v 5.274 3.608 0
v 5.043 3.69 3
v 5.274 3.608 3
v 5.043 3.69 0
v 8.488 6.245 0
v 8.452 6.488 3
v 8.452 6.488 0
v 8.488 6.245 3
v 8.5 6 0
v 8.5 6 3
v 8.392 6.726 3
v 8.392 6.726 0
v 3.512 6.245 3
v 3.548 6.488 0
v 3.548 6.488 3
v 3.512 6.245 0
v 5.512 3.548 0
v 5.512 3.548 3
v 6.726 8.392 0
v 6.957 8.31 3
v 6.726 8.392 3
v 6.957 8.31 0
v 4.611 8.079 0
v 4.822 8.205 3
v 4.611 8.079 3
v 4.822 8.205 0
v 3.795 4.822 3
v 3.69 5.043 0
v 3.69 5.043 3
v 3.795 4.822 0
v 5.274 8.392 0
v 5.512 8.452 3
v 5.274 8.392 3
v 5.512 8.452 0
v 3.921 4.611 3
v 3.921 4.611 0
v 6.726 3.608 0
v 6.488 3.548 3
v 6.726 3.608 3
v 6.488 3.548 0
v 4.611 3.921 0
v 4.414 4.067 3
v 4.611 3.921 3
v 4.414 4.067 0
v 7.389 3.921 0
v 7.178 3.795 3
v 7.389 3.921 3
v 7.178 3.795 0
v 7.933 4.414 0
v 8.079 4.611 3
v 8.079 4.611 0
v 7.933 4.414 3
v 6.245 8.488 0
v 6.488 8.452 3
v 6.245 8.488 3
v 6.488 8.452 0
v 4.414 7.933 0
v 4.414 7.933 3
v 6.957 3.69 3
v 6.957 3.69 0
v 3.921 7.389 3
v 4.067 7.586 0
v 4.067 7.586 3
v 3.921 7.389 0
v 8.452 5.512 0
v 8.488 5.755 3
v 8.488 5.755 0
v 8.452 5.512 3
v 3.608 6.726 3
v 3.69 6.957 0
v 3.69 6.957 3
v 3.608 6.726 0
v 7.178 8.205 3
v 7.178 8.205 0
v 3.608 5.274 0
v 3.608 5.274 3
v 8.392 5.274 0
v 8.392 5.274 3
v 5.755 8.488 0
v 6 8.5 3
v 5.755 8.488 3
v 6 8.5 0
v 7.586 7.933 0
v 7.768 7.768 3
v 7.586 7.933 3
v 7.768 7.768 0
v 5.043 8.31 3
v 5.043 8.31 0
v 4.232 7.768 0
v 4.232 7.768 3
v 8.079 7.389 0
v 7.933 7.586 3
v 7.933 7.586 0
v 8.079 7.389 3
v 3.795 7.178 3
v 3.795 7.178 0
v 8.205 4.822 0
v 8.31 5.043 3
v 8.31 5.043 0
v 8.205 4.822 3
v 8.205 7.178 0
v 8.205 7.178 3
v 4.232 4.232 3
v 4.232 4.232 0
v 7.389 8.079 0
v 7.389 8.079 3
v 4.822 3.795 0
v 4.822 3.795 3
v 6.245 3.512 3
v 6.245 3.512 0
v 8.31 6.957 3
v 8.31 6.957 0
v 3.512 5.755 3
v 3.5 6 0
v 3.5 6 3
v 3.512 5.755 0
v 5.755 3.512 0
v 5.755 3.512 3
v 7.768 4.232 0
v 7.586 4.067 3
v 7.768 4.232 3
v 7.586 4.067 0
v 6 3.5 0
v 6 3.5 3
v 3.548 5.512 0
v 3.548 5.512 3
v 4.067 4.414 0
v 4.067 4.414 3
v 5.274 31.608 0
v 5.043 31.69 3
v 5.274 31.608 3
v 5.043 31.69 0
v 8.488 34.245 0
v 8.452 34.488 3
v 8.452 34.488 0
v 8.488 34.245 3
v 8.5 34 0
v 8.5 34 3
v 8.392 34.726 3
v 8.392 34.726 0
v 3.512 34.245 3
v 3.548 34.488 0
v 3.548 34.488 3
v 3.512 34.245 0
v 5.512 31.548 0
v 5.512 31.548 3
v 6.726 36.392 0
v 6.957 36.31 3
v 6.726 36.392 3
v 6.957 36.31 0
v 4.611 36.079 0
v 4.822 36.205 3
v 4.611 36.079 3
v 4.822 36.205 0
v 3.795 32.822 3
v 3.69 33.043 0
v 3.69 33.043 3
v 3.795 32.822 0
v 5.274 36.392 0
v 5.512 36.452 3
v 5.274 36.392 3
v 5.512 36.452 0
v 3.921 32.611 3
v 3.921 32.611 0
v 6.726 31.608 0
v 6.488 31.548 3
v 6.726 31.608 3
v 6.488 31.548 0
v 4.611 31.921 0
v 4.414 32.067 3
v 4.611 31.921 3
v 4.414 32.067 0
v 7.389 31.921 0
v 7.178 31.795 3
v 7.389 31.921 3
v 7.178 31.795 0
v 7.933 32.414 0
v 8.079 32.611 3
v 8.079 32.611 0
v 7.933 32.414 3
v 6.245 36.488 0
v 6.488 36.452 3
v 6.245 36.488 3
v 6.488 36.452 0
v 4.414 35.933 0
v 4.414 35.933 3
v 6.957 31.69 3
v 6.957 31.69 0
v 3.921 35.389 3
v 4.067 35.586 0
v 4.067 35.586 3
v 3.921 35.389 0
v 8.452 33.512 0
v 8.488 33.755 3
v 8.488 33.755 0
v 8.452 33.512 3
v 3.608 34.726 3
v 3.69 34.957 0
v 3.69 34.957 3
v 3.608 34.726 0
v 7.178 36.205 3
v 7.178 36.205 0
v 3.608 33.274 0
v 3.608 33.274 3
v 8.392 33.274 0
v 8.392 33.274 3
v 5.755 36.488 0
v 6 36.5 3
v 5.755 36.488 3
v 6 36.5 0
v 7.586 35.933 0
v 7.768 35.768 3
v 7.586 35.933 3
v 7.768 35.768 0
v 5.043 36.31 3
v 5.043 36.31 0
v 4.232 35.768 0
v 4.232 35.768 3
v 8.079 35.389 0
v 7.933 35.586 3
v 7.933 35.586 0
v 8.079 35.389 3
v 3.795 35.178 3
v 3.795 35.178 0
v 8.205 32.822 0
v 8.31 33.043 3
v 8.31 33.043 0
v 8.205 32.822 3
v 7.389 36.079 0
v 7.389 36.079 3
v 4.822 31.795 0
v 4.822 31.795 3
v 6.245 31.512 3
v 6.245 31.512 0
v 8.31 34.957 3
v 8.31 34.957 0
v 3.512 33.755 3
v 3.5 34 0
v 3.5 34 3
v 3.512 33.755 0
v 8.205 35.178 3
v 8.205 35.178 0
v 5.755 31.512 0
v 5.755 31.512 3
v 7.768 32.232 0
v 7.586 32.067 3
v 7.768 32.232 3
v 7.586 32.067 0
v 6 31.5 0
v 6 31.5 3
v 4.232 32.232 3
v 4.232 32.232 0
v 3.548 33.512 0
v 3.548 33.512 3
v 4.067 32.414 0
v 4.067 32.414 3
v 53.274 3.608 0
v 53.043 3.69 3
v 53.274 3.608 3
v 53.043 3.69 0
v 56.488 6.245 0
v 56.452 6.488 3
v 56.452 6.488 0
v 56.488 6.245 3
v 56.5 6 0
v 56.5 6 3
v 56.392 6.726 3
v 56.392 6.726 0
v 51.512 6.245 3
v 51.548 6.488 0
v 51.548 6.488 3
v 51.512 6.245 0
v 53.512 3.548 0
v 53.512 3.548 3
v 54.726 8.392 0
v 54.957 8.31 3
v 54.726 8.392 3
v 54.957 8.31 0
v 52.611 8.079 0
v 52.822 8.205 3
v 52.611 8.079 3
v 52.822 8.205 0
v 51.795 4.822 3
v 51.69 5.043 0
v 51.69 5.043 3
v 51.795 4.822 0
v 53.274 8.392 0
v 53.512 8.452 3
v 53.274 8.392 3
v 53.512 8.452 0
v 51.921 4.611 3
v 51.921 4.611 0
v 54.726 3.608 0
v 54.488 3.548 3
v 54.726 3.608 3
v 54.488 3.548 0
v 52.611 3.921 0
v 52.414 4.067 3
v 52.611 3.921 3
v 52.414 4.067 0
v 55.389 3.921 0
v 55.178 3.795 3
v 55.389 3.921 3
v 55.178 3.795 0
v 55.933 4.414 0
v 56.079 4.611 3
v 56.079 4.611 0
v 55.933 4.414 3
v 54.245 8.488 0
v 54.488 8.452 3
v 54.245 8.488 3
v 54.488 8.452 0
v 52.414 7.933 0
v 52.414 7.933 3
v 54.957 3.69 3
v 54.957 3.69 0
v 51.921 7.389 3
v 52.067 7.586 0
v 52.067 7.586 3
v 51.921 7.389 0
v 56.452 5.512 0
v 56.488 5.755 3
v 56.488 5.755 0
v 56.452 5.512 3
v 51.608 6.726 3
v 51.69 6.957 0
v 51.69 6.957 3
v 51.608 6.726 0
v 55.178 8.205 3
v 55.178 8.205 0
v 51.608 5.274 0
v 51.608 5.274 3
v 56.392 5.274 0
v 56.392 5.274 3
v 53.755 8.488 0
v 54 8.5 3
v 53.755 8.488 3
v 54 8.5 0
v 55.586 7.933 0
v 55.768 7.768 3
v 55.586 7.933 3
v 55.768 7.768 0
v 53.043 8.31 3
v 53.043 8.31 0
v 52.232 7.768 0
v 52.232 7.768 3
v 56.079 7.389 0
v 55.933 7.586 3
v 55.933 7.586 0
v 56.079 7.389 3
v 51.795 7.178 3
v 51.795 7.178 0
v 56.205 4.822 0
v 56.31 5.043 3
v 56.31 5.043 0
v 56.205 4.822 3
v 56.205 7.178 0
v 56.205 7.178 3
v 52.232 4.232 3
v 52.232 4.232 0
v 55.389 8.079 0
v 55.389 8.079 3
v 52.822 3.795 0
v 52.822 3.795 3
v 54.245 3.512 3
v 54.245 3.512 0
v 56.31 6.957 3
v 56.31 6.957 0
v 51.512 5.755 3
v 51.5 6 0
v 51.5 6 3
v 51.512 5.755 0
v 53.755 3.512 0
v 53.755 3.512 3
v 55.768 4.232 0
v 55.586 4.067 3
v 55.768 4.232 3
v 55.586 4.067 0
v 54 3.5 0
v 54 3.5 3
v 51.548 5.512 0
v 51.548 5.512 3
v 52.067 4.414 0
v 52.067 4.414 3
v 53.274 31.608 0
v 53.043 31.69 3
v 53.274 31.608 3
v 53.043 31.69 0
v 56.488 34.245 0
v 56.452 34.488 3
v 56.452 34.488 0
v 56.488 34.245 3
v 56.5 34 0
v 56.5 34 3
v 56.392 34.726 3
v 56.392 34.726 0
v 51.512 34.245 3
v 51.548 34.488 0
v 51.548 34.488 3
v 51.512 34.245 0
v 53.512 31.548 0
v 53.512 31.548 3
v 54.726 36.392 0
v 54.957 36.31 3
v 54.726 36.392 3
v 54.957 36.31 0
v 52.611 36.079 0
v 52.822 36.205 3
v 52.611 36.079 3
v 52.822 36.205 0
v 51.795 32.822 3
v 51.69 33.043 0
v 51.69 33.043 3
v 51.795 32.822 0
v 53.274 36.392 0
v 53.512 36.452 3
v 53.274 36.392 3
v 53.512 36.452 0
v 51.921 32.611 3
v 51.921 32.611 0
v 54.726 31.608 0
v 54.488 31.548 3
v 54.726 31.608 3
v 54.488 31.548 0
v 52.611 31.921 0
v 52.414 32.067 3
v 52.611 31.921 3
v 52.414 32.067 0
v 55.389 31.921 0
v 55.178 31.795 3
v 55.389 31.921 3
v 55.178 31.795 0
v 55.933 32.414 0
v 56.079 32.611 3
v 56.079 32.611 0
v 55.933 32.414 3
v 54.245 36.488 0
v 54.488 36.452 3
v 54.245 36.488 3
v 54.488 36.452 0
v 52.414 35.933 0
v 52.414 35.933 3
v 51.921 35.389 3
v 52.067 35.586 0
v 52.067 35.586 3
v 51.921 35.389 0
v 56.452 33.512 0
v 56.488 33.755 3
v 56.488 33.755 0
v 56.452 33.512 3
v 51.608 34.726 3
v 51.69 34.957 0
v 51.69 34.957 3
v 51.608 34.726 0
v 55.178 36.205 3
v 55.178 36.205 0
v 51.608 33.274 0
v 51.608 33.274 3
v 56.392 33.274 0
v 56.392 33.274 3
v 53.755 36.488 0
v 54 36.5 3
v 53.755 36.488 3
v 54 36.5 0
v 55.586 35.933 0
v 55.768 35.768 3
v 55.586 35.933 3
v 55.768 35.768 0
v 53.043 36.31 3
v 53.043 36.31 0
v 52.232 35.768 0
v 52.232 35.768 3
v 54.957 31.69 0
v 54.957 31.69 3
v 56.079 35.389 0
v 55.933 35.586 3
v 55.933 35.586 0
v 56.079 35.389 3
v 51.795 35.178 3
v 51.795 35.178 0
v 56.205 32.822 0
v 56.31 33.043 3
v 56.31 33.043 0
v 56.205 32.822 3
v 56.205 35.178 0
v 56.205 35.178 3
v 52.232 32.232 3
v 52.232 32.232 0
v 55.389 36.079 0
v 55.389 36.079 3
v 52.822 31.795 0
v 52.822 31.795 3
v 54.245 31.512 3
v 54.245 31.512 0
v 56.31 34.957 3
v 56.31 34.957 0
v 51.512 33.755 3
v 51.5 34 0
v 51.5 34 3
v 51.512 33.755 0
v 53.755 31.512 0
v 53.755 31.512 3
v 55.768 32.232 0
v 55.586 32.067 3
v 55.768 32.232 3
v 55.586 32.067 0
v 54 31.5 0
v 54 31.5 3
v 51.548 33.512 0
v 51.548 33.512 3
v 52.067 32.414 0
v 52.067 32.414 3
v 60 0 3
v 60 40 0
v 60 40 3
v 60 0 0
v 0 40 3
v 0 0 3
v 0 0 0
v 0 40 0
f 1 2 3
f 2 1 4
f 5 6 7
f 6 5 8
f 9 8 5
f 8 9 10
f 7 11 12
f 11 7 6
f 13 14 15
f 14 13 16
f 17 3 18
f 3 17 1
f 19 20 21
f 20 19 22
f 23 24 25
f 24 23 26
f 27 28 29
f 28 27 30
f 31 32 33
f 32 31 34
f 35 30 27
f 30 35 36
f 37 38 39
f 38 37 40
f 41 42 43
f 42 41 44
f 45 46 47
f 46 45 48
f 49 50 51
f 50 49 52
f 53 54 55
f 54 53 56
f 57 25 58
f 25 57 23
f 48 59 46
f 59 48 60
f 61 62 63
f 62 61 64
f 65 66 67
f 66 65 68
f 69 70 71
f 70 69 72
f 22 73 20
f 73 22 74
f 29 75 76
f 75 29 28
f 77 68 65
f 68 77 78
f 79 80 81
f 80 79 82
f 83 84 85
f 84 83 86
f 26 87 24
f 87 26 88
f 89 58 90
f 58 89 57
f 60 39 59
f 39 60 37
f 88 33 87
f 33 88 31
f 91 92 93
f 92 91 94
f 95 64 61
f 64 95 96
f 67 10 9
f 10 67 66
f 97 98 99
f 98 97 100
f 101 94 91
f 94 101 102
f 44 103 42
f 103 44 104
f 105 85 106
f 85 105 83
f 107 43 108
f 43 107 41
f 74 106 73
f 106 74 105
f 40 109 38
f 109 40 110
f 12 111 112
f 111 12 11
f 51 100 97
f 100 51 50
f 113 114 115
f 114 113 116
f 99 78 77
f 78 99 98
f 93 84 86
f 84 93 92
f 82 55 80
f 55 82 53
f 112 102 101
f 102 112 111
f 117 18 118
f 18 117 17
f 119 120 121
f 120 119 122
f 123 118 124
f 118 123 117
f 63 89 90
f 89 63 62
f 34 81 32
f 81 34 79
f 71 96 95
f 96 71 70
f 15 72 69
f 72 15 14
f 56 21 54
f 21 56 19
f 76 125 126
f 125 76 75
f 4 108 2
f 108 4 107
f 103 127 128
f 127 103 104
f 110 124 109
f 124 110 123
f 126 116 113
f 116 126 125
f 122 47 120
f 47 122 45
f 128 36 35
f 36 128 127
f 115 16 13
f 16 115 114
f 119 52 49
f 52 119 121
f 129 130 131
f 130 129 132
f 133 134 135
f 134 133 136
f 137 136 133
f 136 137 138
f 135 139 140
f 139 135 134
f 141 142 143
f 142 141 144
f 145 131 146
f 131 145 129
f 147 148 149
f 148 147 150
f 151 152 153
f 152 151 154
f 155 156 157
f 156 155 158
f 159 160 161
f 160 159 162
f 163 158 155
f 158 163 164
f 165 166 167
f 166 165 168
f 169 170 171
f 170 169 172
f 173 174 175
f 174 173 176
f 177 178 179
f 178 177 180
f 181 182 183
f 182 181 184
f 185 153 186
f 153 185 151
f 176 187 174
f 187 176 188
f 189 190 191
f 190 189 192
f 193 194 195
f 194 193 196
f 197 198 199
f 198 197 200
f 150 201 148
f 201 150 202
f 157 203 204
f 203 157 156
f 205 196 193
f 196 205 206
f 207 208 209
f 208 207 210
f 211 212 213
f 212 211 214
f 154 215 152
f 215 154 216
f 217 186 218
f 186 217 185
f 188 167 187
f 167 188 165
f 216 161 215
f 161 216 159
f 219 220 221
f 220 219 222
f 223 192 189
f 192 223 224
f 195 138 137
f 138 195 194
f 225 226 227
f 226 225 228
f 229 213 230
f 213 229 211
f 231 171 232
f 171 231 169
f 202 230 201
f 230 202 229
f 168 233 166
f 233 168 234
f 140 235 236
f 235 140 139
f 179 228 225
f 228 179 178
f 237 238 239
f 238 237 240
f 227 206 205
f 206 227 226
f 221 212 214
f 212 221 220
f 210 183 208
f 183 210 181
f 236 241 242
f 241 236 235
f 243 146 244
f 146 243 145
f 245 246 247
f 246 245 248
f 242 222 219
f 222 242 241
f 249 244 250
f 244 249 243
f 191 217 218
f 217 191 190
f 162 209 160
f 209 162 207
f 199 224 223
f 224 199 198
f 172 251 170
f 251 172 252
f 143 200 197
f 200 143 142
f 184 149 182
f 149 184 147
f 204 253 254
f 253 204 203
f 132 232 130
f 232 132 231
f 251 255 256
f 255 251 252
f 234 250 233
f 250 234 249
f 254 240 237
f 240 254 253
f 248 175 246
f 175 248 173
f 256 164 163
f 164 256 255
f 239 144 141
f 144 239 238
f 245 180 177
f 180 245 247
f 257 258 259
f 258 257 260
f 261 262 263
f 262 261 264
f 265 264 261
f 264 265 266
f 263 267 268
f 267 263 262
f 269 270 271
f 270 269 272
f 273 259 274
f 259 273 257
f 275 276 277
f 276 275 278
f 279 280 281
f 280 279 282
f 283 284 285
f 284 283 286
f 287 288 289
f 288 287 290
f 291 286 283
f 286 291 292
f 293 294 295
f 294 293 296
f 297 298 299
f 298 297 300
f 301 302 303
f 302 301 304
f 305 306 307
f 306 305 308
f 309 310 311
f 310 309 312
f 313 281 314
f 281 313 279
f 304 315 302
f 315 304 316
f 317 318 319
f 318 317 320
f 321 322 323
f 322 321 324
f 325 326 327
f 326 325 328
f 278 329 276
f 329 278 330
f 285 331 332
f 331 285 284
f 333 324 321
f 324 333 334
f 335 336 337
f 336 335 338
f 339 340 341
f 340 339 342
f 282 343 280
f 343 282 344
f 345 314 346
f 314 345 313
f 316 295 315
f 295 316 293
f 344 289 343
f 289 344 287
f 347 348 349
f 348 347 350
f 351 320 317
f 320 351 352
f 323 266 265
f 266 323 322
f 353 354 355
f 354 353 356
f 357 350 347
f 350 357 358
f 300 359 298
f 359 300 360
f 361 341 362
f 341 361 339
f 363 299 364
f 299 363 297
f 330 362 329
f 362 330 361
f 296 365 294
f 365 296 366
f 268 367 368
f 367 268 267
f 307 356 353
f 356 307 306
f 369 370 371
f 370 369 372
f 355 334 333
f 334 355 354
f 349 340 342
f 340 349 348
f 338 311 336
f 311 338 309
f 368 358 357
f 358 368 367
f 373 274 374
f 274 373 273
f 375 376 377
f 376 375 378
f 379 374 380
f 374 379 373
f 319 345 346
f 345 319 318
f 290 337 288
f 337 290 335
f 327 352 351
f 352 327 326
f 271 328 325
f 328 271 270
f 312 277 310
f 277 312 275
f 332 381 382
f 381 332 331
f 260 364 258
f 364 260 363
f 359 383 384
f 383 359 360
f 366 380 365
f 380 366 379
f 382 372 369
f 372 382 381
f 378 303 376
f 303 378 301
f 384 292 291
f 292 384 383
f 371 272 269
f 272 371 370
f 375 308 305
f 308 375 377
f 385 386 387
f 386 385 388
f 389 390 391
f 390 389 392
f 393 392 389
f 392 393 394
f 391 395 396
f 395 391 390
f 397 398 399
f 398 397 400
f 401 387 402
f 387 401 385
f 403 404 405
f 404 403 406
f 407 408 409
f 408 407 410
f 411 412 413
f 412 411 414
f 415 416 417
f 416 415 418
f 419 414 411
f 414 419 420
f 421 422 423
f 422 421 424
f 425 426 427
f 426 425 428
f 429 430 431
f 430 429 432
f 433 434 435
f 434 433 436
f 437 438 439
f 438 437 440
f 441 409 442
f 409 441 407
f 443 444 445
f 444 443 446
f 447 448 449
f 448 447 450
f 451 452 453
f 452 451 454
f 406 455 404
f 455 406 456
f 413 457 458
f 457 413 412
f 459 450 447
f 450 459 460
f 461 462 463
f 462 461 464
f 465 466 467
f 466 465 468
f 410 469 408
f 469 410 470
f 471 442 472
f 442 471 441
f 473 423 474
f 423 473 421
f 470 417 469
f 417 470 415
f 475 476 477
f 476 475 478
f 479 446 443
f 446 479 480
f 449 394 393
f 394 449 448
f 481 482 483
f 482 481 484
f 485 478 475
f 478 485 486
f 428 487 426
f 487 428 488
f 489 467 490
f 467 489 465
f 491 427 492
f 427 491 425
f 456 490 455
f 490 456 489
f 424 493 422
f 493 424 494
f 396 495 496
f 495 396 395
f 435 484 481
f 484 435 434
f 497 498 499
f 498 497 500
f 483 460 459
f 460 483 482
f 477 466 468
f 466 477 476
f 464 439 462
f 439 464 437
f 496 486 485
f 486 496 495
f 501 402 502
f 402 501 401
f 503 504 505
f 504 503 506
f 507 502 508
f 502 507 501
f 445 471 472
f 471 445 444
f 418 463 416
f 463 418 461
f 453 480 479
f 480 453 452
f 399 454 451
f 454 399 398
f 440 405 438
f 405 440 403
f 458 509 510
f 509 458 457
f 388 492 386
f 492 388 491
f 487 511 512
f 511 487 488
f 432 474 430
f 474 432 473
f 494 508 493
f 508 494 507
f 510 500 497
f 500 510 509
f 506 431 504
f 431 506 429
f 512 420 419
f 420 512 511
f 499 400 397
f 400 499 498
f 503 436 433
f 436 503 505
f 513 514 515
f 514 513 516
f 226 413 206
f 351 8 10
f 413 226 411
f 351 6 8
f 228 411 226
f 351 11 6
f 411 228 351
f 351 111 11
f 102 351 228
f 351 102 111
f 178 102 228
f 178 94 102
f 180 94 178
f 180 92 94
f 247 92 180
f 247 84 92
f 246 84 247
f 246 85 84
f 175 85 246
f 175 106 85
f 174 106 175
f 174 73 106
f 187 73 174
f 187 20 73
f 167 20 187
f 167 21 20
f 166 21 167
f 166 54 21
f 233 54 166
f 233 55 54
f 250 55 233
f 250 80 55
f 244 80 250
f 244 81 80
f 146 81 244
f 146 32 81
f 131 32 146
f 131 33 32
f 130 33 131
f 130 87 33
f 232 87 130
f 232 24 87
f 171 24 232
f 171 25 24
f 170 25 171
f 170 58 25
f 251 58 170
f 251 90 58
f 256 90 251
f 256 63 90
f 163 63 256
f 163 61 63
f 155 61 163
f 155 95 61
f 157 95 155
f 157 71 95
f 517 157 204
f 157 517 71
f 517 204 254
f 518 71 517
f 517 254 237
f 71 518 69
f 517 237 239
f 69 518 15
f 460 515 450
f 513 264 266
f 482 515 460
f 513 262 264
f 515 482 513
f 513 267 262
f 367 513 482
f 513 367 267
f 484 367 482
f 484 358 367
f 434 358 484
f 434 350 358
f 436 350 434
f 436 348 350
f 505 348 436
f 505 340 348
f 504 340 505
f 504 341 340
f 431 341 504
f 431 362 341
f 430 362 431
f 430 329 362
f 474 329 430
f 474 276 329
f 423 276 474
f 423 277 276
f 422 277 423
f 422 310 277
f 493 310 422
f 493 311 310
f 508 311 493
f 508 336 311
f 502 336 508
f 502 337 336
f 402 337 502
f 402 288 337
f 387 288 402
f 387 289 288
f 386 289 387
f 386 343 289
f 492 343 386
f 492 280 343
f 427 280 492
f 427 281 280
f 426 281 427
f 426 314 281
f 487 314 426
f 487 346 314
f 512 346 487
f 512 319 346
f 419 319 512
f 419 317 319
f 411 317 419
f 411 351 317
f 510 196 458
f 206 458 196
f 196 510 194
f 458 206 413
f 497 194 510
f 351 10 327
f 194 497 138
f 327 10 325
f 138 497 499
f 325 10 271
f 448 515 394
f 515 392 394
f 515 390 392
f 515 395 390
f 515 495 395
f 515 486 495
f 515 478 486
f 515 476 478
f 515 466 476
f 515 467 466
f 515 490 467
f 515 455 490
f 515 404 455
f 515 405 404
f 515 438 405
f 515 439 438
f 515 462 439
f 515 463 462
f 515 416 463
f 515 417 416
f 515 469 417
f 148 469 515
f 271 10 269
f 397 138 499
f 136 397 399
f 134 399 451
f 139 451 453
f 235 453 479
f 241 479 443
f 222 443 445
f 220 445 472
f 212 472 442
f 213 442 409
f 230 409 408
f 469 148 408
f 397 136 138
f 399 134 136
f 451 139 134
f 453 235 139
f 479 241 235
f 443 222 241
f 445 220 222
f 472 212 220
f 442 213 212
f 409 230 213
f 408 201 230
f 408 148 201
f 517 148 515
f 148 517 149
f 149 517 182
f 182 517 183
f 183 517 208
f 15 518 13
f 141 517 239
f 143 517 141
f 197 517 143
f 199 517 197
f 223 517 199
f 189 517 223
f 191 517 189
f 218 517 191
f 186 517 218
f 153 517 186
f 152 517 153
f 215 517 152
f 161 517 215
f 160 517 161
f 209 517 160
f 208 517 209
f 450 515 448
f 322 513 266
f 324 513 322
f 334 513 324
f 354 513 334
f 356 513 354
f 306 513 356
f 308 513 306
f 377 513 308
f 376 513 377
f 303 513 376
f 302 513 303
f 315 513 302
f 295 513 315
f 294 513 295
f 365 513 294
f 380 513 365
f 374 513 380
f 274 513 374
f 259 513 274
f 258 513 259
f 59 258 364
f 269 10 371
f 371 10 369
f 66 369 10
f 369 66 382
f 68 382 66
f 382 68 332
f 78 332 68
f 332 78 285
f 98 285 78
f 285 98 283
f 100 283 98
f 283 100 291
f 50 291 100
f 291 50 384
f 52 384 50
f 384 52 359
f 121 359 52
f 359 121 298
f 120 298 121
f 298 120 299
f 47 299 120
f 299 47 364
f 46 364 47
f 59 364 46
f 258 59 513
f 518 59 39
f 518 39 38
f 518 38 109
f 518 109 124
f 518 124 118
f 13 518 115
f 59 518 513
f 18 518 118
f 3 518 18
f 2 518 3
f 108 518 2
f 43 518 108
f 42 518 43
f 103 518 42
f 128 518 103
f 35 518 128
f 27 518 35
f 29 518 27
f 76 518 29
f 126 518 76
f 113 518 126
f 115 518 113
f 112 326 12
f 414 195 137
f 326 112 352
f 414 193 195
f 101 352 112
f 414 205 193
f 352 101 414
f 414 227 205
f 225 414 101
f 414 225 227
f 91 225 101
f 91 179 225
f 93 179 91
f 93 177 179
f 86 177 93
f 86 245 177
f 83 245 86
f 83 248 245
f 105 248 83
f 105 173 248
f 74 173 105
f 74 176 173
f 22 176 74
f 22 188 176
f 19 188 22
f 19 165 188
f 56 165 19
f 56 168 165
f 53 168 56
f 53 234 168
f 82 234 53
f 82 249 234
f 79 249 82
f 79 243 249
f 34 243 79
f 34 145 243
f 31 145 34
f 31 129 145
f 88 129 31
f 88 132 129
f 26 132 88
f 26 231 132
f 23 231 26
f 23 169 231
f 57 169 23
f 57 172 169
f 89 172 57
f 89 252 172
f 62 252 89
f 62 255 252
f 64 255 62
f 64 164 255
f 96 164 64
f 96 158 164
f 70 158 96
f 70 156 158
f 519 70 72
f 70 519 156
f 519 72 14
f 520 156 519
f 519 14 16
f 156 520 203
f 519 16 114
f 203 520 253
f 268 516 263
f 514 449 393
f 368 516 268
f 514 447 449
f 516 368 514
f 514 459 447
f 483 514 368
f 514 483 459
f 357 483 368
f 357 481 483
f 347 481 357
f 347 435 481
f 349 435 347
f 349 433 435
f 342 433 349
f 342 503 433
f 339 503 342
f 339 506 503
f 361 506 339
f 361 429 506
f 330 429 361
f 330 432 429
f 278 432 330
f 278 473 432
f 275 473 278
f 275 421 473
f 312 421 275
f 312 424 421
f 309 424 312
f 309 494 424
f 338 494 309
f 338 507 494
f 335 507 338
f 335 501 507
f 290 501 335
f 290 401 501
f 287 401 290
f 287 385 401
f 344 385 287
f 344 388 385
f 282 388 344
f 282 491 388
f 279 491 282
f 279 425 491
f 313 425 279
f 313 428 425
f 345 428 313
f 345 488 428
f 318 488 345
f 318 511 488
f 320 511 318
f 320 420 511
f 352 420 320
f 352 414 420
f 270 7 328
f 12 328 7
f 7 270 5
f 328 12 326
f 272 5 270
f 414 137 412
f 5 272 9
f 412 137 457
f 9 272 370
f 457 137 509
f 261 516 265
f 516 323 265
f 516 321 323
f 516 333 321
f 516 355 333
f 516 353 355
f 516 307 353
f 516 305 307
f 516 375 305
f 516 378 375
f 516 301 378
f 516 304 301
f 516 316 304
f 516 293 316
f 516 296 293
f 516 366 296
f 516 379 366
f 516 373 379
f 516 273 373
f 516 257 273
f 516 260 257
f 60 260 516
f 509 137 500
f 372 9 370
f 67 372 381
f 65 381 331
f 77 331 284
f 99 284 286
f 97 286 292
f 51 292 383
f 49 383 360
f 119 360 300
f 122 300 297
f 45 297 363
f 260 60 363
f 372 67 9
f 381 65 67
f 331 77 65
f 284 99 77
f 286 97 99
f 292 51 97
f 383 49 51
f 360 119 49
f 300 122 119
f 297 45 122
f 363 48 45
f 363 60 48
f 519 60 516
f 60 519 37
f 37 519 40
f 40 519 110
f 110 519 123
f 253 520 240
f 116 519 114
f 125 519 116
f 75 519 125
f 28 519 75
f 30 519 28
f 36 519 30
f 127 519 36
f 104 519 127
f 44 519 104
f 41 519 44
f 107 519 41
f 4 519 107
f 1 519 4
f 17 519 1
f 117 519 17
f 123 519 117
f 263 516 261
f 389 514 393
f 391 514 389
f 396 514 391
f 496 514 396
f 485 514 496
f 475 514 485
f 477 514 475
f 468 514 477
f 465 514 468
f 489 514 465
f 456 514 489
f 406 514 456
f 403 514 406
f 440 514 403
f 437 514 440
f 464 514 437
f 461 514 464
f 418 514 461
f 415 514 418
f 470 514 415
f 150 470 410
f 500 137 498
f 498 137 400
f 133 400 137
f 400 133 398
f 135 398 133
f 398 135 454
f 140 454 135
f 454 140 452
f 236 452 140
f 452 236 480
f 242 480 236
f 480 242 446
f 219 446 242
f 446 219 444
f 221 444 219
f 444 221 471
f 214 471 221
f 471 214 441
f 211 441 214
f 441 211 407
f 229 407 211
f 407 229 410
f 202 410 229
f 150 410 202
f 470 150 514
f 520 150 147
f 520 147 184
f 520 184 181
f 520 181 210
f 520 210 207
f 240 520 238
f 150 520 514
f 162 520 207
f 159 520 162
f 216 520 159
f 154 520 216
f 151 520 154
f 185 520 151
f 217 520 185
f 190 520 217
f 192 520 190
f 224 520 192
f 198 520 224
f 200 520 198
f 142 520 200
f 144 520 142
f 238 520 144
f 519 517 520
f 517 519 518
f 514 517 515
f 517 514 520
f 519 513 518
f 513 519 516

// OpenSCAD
// A mounting plate. Drag the numbers, or edit freely.
$fn = 64;

plate_x = 60;  // [20:120]
plate_y = 40;  // [20:120]
plate_z = 3;   // [1:0.5:10]
hole_d  = 5;   // [2:0.5:12]
inset   = 6;   // [3:20]

// ---- PART 1 ----
difference() {
  cube([plate_x, plate_y, plate_z]);
  for (x = [inset, plate_x - inset], y = [inset, plate_y - inset])
    translate([x, y, -1])
      cylinder(h = plate_z + 2, d = hole_d);
}
// ---- PART 1 END ----
